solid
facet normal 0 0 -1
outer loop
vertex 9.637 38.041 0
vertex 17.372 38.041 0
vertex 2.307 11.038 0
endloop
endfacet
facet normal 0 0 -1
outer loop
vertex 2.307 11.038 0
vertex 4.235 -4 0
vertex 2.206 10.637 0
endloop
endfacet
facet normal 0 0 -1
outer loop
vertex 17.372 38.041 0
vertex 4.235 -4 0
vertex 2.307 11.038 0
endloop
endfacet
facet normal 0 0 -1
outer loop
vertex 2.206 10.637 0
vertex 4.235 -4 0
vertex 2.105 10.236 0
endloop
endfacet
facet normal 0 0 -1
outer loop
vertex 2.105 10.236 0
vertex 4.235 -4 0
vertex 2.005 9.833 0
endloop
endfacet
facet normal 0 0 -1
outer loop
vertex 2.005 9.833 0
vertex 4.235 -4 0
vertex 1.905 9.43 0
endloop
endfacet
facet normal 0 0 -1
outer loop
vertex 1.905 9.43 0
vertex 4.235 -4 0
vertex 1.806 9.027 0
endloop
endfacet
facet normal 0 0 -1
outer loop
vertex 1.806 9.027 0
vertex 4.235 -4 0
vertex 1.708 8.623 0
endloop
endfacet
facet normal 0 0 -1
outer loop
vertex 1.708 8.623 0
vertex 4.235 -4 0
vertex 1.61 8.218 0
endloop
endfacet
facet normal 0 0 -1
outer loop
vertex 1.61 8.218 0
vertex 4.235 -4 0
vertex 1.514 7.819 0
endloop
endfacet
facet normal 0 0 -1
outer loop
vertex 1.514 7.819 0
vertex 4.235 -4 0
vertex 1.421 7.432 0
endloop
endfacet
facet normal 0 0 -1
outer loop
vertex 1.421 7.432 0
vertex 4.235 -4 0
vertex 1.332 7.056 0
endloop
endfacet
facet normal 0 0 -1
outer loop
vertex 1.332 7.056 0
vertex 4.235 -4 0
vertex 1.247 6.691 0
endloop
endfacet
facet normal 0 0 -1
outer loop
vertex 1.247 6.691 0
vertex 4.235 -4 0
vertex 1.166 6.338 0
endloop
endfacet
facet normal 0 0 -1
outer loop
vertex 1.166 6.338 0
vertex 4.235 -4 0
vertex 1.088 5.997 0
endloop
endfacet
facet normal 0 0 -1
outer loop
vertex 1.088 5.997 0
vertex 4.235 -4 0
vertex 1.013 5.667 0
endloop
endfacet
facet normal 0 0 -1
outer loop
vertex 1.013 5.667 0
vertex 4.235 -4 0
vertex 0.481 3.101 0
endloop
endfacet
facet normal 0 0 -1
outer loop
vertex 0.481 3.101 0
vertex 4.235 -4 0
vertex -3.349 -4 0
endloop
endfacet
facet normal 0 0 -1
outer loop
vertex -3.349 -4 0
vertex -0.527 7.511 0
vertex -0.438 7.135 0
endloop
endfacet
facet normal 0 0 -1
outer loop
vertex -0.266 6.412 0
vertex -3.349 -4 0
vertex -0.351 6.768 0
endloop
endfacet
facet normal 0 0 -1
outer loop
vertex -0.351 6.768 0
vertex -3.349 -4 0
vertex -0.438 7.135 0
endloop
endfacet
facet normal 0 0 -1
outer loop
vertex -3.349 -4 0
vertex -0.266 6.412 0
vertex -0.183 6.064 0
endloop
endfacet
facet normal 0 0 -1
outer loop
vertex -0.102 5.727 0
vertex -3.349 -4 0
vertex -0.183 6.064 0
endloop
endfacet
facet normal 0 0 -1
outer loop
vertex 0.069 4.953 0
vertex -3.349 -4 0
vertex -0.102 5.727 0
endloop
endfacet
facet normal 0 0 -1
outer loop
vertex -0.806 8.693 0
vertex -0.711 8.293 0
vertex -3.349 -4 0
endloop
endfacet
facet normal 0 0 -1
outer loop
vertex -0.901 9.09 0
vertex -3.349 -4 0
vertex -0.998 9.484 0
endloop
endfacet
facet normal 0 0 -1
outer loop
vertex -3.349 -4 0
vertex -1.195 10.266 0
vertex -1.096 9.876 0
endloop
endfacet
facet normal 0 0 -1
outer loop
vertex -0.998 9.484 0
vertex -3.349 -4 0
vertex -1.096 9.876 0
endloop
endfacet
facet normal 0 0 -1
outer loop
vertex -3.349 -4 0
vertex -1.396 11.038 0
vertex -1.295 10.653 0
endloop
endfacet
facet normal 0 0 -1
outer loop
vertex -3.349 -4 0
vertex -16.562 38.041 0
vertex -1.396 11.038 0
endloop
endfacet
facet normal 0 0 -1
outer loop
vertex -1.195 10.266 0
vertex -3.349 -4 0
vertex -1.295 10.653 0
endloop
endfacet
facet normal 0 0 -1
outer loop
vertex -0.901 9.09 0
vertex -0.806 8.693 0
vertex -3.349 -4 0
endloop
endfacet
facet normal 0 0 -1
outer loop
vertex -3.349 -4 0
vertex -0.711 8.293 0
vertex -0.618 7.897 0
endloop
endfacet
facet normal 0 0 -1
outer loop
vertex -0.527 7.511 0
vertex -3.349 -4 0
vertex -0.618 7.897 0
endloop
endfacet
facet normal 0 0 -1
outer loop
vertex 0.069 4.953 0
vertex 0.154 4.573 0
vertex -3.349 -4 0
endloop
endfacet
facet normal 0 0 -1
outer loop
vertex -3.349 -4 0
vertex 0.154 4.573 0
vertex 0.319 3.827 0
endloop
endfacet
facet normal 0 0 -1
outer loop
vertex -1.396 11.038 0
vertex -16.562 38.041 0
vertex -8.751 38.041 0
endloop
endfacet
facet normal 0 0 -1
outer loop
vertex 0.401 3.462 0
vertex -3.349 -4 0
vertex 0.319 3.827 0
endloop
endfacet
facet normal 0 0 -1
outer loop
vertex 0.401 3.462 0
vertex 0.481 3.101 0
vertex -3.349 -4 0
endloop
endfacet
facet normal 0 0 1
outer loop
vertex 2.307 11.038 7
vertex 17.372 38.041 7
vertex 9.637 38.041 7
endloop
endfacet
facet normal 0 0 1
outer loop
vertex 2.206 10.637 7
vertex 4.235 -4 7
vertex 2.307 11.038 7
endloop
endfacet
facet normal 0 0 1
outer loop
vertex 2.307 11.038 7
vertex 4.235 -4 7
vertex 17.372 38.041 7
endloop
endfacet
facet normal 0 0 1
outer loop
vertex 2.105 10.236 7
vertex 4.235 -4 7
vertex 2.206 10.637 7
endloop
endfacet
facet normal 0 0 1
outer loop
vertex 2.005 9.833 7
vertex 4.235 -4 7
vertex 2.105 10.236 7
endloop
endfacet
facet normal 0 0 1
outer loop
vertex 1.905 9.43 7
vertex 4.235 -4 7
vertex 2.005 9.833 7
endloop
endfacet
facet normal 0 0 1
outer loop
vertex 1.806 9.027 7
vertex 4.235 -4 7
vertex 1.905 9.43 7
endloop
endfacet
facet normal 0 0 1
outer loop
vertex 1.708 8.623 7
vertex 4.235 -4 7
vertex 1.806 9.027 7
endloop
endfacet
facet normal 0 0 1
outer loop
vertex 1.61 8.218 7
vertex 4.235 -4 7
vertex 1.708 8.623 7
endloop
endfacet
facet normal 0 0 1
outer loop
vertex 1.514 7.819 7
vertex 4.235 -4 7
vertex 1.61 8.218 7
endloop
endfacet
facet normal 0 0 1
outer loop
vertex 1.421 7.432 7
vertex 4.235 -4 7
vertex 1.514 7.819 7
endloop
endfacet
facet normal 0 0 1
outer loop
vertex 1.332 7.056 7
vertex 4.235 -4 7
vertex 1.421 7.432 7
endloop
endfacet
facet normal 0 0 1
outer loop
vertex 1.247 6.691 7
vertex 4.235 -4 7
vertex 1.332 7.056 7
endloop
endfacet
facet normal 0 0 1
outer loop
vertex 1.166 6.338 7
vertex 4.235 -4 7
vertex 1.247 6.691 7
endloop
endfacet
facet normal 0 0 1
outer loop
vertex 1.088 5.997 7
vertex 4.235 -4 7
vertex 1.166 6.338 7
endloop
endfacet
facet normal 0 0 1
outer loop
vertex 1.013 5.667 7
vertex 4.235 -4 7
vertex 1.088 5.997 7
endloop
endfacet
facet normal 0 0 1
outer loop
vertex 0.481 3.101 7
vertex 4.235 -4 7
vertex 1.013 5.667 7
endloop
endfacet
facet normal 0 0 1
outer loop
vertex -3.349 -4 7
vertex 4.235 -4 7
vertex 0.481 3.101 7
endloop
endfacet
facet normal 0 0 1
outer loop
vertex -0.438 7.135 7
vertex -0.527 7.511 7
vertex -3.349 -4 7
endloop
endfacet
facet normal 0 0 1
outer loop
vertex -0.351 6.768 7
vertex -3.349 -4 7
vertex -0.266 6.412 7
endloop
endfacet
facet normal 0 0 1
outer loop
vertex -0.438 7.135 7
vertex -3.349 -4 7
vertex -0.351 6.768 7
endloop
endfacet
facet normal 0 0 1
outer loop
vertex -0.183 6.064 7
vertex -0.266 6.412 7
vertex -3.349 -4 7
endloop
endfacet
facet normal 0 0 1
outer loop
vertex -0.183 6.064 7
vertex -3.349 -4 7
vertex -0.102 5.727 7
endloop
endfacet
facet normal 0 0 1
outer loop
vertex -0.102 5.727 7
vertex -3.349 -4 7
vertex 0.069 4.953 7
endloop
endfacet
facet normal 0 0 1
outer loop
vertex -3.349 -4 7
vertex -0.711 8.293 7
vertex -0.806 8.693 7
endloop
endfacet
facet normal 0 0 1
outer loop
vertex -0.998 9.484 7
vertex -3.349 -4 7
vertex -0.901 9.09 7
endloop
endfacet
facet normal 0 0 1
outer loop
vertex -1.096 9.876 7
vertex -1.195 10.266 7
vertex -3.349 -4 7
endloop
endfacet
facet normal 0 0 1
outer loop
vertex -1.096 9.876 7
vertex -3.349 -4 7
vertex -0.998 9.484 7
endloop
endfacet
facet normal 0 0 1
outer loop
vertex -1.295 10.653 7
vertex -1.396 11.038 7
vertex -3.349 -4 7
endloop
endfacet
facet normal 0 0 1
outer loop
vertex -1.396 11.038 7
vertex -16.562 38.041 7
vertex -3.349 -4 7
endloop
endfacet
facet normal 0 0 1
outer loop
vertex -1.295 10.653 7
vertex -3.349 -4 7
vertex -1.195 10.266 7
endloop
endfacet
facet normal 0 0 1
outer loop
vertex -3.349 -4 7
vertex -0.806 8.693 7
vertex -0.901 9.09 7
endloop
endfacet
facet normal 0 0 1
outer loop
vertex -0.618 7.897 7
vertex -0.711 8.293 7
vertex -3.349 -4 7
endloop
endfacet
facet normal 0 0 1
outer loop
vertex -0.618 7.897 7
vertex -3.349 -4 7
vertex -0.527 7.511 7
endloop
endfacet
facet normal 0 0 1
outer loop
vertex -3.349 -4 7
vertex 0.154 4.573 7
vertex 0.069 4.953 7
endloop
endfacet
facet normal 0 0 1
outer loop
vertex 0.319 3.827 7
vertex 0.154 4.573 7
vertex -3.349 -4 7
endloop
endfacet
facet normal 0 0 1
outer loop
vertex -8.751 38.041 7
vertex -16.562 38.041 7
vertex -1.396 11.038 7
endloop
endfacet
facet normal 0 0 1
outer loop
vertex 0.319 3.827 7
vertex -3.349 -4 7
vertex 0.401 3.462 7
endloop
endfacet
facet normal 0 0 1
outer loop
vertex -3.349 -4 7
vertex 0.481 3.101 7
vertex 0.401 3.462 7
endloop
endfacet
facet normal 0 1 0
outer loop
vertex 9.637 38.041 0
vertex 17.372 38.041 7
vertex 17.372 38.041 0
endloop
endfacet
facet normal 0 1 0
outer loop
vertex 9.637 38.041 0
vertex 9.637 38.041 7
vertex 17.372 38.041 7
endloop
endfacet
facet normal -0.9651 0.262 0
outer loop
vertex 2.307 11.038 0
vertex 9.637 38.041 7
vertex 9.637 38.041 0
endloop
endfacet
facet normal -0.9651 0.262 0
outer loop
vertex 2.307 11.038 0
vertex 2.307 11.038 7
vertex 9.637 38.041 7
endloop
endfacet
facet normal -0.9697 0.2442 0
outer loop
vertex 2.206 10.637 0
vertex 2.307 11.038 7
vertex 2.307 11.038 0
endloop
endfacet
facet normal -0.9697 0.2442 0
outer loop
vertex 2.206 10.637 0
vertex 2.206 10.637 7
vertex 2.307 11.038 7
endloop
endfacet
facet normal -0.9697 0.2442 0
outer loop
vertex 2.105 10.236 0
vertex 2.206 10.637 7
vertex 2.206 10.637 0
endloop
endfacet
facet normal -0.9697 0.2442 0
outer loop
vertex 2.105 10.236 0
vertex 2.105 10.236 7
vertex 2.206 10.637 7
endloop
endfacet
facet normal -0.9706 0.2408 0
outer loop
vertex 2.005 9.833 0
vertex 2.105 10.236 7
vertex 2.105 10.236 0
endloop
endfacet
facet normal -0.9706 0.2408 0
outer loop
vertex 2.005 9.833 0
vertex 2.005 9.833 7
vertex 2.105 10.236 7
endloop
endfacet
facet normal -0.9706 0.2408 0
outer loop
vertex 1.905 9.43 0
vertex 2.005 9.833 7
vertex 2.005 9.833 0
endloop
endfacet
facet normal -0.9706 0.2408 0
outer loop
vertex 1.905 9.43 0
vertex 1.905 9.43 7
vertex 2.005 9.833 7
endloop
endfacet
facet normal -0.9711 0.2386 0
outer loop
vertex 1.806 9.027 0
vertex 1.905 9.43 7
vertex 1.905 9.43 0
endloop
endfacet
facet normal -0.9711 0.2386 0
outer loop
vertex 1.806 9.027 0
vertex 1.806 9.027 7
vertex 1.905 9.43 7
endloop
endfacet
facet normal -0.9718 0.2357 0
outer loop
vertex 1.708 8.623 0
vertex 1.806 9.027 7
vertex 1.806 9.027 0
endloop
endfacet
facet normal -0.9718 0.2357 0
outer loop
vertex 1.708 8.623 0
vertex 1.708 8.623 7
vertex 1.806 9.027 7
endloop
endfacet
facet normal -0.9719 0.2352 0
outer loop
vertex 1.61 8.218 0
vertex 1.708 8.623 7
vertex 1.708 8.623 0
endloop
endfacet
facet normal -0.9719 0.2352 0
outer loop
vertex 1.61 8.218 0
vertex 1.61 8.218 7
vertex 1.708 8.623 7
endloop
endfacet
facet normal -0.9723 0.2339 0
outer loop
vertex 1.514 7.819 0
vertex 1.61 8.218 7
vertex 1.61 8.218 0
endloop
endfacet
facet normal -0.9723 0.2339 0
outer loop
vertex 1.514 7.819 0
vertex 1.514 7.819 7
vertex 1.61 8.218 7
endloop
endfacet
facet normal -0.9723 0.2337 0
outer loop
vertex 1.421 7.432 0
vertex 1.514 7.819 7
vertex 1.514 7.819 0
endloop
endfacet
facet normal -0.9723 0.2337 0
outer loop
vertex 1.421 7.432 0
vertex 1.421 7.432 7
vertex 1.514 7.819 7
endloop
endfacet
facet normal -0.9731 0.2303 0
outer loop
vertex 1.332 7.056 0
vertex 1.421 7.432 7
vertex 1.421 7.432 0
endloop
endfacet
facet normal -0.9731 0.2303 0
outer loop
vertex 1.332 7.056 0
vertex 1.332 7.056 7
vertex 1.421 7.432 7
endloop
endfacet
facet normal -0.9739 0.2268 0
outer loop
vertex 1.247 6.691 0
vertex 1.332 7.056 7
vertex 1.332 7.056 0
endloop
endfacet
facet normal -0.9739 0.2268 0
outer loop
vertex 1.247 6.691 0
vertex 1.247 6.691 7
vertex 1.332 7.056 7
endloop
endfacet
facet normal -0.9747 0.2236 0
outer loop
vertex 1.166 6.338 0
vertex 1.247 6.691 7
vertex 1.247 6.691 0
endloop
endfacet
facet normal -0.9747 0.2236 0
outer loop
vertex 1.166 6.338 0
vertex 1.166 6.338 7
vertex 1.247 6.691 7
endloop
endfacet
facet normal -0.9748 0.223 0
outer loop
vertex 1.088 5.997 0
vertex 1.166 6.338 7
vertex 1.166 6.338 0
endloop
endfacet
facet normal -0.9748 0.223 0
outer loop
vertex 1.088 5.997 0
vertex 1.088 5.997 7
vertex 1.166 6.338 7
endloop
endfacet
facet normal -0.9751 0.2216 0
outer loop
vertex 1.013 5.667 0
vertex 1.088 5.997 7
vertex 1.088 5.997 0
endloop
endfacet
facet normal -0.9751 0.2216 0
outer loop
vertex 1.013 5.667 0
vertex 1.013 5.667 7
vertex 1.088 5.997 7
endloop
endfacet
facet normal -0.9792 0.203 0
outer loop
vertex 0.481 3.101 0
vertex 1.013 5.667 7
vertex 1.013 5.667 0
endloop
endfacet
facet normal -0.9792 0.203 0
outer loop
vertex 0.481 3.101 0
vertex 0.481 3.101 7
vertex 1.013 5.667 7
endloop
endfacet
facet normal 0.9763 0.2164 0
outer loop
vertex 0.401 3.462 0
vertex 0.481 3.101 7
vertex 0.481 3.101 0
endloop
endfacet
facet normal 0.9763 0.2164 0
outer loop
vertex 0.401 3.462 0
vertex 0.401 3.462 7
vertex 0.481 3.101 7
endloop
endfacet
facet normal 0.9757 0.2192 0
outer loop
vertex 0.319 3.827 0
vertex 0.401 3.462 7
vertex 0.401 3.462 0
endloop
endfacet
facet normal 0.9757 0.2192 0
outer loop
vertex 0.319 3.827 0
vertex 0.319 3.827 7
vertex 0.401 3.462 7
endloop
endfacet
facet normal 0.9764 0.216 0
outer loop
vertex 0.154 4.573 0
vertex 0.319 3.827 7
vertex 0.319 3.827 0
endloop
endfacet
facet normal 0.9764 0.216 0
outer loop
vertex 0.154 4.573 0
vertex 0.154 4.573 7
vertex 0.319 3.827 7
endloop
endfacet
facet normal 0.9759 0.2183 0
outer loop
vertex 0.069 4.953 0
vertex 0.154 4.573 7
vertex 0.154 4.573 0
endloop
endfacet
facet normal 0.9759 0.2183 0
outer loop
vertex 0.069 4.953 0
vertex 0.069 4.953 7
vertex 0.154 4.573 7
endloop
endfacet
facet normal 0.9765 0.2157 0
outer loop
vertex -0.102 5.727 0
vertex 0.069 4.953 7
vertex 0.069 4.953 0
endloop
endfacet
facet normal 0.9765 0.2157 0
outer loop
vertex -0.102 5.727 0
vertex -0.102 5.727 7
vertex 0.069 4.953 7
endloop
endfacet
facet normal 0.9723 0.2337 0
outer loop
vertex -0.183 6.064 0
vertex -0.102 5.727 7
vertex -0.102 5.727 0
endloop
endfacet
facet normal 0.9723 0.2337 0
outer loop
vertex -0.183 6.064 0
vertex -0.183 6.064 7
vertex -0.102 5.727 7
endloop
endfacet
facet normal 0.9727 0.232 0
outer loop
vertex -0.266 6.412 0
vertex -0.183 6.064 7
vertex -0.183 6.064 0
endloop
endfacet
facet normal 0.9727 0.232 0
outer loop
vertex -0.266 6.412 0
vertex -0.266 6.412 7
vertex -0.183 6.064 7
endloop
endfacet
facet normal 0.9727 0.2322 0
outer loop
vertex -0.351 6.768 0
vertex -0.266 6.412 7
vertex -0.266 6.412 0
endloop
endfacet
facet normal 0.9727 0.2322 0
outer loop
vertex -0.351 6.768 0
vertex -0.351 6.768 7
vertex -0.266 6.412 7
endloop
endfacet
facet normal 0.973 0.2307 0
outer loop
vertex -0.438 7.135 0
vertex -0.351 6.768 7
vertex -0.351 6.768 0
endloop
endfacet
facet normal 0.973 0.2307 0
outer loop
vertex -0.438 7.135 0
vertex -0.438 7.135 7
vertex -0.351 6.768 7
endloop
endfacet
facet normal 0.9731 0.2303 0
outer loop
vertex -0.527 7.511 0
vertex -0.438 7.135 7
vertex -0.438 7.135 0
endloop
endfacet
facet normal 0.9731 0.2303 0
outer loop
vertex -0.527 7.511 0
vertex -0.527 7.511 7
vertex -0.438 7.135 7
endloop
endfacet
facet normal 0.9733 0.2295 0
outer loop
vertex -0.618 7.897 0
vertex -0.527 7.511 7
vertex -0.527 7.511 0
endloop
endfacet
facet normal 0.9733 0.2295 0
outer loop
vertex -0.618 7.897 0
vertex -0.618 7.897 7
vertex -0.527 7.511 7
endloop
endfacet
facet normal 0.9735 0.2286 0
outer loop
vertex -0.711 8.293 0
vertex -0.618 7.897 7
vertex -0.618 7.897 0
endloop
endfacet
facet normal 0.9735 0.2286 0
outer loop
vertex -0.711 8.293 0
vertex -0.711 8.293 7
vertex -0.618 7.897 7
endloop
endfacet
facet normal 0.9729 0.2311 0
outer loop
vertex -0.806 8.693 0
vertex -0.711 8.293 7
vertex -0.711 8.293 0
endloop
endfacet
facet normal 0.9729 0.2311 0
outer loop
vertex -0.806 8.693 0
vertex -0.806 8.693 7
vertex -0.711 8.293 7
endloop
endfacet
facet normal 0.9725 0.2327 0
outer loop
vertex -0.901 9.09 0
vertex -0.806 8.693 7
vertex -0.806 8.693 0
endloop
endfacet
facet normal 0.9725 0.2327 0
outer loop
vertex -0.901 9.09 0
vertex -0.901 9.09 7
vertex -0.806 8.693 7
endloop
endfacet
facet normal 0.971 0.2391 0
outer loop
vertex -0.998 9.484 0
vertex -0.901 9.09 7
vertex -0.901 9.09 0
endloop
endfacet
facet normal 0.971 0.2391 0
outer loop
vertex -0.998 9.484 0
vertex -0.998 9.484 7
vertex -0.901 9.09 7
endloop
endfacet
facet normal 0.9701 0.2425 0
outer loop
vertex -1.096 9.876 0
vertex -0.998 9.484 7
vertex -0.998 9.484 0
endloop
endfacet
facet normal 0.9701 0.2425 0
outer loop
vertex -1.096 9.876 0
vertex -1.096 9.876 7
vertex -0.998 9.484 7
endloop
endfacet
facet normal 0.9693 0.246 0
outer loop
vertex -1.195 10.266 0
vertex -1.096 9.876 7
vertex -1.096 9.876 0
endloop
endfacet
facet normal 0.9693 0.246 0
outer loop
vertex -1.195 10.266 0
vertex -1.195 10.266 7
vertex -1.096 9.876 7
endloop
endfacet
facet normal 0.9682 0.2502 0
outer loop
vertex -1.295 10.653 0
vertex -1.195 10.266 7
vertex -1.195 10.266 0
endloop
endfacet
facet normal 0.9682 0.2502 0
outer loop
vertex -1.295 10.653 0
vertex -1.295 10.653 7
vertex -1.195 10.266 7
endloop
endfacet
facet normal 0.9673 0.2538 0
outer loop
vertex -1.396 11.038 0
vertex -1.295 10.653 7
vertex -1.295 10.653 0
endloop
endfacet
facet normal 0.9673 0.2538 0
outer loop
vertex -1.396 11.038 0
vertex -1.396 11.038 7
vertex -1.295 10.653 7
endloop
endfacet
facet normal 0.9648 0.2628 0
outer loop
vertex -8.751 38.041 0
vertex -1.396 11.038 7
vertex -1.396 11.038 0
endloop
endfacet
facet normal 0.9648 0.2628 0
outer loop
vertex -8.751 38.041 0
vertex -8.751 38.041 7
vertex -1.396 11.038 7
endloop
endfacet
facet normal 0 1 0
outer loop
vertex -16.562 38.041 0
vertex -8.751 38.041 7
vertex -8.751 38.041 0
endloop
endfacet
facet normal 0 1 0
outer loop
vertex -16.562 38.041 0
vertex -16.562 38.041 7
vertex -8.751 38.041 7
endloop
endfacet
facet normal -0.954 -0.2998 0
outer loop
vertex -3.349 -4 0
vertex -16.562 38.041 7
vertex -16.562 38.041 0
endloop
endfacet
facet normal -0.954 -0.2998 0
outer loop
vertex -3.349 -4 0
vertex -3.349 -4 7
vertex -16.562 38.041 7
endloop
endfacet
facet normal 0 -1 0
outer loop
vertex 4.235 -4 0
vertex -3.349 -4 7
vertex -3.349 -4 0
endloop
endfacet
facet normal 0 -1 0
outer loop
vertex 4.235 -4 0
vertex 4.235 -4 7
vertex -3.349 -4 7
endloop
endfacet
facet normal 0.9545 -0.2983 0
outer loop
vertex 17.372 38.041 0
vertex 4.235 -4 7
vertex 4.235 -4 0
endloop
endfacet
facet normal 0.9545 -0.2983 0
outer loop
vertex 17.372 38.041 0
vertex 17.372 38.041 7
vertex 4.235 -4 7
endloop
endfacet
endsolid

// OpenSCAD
// file: glyph.scad
// glyph — the shared geometry of every letter in the set. Defines named geometry
// only, so it renders nothing on its own; each letter part includes it and calls
// letter(). Every dimension lives in ../../lib/common.scad.
//
// A LETTER IS NOTHING BUT A LETTER. No plinth, no tongue, no tab — it is the
// bare glyph, and it attaches by standing in the deck groove and resting on the
// groove's floor. Anything else on it would be a distraction on a learning toy.
//
// It is a flat plate of one thickness, printed face-down: no overhang anywhere,
// no supports, and the face on the bed comes out smoothest.
//
// TWO TRAPS WITH text():
//
//  * A missing font FALLS BACK SILENTLY — no warning, no error, just different
//    letters. "Liberation Sans" was the first choice here because OpenSCAD
//    bundles it; on macOS the bundled faces are not registered with fontconfig,
//    so it rendered the fallback face instead and nothing said so. To check a
//    font resolved, render a string with it and with a deliberately bogus name
//    and compare bounding boxes: identical means it fell back.
//  * `size` is not the cap height in general. For Helvetica Bold they coincide
//    (size 44 -> 44.0 mm cap), which is why letter_size reads as a height.
//    Change the font and re-measure.

include <../../lib/common.scad>

// The letter's outline, upright in the XY plane, ready to be extruded along Z
// (which is the letter's thickness, and the print's build axis).
//
//   y = 0   is the deck surface
//   y < 0   is the part standing down inside the groove. It reaches letter_bury,
//           which is where the tapered groove closes to letter_t — NOT the
//           groove's floor. The letter wedges; it never bottoms out.
module glyph_2d(ch) {
    intersection() {
        translate([0, -letter_bury])
            scale([letter_condense, 1])
                text(ch, size = letter_size, font = letter_font,
                     halign = "center", valign = "baseline");
        // Trimmed flat at the baseline. Round letters (O, C, G, S) overshoot the
        // baseline by design, and a letter standing on a convex curve rocks —
        // there is nothing to stop it leaning. The trim costs nothing visible
        // and gives every letter a flat foot on the groove floor.
        translate([-200, -letter_bury]) square([400, 400]);
    }
}

// One letter, in its print orientation: lying on its face, thickness up Z.
module letter(ch) {
    linear_extrude(letter_t) glyph_2d(ch);
}

// Where that letter sits once it is dropped into a chassis, for fit checks.
module letter_fitted(ch) {
    translate([0, letter_t/2, body_top]) rotate([90, 0, 0]) letter(ch);
}
// main file
// letter V — one part. See glyph.scad for the geometry and lib/common.scad for
// the dimensions. Prints lying on its face, exactly as exported: no supports.

include <glyph.scad>

letter("V");
